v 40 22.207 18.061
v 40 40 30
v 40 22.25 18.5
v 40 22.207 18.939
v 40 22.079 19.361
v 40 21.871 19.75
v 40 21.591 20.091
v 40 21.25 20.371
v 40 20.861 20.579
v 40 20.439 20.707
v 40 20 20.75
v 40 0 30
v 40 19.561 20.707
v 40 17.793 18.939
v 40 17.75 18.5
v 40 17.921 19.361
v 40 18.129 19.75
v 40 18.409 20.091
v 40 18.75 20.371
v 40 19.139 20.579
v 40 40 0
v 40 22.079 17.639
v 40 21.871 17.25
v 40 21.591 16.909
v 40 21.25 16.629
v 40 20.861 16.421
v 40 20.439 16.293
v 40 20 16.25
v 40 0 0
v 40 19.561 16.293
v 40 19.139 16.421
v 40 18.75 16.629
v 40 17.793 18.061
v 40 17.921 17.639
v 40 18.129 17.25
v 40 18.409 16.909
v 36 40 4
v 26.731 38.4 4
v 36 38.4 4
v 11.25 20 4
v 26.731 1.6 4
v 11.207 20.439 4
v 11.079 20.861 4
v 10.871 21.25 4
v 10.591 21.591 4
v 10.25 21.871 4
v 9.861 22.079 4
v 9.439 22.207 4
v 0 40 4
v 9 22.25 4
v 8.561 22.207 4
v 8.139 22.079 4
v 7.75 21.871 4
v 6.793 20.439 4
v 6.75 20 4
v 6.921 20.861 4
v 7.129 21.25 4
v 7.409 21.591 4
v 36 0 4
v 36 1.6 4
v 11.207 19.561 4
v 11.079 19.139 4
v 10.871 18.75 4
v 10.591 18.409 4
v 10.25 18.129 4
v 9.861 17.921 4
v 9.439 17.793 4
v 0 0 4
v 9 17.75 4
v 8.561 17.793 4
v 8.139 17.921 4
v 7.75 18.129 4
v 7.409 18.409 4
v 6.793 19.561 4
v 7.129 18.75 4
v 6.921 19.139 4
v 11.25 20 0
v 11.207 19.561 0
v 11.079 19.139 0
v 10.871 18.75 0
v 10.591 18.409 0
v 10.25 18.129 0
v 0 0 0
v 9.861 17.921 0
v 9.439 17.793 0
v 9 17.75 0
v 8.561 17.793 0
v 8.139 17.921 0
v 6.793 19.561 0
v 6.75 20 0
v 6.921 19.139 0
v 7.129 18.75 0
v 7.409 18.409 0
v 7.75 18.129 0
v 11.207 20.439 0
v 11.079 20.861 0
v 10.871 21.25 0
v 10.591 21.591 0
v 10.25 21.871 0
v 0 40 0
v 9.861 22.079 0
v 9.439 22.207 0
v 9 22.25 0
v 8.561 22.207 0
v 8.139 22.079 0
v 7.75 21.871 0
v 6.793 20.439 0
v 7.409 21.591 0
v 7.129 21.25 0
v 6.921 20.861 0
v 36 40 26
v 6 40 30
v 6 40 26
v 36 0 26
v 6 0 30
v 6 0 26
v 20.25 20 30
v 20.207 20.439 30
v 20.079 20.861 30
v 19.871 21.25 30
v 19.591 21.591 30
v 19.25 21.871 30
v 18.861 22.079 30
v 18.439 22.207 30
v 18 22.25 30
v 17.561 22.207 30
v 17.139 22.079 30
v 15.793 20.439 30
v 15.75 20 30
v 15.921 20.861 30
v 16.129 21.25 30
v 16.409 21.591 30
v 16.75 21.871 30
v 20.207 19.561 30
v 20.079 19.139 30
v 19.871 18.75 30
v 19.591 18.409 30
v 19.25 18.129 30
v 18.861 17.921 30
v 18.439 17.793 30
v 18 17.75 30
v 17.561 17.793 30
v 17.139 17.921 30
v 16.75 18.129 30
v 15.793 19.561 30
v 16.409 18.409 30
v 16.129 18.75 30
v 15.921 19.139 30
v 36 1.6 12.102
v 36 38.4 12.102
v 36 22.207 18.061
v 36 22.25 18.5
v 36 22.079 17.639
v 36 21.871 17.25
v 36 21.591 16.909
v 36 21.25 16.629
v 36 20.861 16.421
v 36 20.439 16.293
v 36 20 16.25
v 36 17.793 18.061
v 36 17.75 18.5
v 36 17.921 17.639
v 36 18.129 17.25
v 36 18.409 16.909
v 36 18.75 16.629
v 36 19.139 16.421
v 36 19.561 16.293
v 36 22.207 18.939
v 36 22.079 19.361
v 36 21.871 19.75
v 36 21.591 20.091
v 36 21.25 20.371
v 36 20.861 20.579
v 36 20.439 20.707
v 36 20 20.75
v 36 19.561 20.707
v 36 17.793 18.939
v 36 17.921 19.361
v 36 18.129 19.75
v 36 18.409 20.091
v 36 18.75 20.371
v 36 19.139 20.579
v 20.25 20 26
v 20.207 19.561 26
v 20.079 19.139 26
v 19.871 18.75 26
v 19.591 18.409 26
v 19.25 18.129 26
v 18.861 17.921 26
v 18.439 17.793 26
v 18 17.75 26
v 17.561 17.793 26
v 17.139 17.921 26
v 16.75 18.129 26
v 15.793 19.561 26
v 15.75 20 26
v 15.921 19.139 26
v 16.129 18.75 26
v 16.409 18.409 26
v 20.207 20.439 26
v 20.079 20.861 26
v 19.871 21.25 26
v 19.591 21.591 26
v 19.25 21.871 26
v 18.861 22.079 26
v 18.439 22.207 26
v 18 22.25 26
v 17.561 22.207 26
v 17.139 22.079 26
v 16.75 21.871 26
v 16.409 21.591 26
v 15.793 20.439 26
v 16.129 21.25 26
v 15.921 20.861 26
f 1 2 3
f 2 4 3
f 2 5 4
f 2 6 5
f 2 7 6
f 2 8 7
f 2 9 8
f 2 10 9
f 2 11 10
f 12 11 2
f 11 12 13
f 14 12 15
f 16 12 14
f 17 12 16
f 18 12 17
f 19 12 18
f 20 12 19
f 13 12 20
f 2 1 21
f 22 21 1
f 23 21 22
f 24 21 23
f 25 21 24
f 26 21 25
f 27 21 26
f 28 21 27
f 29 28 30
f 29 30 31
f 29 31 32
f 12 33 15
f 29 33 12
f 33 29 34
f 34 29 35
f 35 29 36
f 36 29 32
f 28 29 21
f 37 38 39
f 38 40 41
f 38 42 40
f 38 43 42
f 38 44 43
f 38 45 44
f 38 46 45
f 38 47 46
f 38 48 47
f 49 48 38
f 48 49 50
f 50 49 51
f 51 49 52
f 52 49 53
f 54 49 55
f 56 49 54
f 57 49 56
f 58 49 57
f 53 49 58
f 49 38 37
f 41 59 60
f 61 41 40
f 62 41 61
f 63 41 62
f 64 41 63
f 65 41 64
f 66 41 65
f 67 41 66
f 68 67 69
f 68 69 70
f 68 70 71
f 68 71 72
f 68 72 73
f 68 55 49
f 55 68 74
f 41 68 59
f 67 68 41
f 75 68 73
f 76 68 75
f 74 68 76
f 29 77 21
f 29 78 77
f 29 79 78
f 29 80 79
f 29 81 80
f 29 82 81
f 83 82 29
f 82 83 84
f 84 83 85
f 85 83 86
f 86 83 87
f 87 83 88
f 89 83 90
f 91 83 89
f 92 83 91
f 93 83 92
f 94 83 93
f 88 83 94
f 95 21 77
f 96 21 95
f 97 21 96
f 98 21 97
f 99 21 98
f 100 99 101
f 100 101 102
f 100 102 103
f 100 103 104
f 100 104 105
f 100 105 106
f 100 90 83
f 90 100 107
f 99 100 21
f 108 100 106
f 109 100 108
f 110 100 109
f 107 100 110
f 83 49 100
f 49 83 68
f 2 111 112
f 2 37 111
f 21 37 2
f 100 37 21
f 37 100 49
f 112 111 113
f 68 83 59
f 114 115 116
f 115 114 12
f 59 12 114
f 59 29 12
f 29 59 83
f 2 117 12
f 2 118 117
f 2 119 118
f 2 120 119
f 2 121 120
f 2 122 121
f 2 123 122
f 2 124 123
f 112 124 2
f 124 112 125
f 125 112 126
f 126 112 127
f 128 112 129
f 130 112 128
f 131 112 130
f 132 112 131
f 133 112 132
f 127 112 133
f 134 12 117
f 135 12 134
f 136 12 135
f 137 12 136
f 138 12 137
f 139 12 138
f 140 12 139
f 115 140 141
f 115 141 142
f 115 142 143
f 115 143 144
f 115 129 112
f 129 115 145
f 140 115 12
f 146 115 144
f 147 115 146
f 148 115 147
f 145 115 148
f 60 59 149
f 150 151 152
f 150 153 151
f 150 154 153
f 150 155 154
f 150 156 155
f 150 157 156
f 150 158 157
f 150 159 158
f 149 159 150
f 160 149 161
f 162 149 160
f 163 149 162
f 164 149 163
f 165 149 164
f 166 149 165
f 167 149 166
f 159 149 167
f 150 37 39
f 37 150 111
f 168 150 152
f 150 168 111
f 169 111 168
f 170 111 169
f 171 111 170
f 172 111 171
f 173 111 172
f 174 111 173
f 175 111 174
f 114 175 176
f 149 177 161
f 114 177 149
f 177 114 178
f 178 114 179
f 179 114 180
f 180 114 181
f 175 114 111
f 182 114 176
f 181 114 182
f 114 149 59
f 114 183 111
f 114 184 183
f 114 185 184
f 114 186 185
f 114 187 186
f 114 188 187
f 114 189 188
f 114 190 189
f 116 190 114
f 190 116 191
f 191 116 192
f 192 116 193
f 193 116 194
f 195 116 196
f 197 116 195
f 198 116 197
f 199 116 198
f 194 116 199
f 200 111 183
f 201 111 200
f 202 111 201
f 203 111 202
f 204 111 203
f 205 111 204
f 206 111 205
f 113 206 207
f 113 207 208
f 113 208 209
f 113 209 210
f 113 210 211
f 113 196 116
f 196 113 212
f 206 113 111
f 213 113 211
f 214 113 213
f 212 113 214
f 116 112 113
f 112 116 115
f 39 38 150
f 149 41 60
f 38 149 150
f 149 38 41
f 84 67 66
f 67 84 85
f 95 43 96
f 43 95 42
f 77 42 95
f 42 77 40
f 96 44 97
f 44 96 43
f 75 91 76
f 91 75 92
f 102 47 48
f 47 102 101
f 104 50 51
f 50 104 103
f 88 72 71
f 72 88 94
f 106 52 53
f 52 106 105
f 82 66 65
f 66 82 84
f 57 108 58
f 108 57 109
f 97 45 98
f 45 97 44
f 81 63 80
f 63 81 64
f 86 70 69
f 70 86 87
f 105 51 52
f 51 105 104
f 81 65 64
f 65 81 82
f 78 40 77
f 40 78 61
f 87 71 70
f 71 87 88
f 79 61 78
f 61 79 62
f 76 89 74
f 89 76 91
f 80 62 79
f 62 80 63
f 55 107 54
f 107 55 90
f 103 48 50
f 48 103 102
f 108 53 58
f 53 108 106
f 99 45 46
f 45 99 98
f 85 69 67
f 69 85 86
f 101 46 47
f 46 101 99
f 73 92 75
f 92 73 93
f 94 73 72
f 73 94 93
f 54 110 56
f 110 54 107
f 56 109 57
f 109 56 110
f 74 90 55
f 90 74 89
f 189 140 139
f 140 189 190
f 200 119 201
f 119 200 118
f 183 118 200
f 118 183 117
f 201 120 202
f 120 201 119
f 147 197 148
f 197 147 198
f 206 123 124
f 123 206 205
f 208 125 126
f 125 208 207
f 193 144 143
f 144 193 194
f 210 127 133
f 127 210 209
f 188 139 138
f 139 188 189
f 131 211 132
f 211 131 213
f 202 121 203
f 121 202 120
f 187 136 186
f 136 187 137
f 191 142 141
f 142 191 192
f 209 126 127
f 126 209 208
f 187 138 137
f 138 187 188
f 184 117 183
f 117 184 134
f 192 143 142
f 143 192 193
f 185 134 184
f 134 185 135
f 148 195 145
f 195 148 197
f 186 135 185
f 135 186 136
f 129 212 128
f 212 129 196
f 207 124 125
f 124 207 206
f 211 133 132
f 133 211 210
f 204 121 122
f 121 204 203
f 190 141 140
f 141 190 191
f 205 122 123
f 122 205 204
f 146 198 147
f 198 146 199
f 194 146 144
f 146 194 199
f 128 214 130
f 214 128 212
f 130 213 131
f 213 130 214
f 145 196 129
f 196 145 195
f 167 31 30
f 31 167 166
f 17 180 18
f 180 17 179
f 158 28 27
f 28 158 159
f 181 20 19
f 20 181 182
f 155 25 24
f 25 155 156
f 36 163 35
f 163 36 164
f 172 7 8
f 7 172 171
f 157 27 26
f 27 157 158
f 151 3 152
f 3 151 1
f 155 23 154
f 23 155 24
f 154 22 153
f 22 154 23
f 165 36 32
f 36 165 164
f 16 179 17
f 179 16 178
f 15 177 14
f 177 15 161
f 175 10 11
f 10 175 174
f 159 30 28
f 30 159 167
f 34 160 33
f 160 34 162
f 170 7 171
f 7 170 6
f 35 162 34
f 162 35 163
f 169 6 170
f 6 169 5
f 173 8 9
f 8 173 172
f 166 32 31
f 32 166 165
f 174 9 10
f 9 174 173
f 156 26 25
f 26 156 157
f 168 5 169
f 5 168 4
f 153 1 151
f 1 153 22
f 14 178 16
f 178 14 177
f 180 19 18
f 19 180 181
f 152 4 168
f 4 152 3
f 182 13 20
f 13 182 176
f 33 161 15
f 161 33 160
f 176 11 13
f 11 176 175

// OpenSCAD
$fn = 32;

// ----------------------------------------------------------------------
// Z-bracket: 40 x 40 x 30 mm
// ----------------------------------------------------------------------

// --- parameters (mm) ---
foot_len = 40;            // lower foot length, X
top_len = 30;             // upper foot length, X
depth = 40;               // bracket width, Y
step_h = 30;              // overall rise, Z
plate_t = 4;              // plate thickness
hole_d = 4.5;             // clearance for M4
rib_len = 11.1;           // gusset leg
rib_sink = 1.6;           // gusset overlap into the plates

module hole_z(px, py, z0) {
  translate([px, py, z0 - 2.5]) cylinder(h = plate_t + 5, d = hole_d);
}
module hole_x(py, pz) {
  translate([-2.5, py, pz]) rotate([0, 90, 0]) cylinder(h = plate_t + 5, d = hole_d);
}
module gusset(x0) {
  translate([x0, depth - rib_sink, 0])
    rotate([90, 0, 0])
      linear_extrude(height = depth - 2 * rib_sink)
        polygon(points = [[rib_sink, plate_t - rib_sink],
                          [rib_sink, plate_t - rib_sink + rib_len],
                          [-rib_len, plate_t - rib_sink]]);
}

difference() {
  union() {
    cube([foot_len, depth, plate_t]);
    /* web, overlapping the lower foot */
    translate([foot_len - plate_t, 0, 0]) cube([plate_t, depth, step_h]);
    /* upper foot, sunk into the web */
    translate([foot_len - plate_t - top_len, 0, step_h - plate_t]) cube([top_len + plate_t, depth, plate_t]);
    gusset(foot_len - plate_t);
  }
  hole_z(9, 20, 0);
  translate([foot_len - plate_t - 18, 0, 0]) hole_z(0, 20, step_h - plate_t);
  translate([foot_len - plate_t, 0, 0]) hole_x(20, 18.5);
}
